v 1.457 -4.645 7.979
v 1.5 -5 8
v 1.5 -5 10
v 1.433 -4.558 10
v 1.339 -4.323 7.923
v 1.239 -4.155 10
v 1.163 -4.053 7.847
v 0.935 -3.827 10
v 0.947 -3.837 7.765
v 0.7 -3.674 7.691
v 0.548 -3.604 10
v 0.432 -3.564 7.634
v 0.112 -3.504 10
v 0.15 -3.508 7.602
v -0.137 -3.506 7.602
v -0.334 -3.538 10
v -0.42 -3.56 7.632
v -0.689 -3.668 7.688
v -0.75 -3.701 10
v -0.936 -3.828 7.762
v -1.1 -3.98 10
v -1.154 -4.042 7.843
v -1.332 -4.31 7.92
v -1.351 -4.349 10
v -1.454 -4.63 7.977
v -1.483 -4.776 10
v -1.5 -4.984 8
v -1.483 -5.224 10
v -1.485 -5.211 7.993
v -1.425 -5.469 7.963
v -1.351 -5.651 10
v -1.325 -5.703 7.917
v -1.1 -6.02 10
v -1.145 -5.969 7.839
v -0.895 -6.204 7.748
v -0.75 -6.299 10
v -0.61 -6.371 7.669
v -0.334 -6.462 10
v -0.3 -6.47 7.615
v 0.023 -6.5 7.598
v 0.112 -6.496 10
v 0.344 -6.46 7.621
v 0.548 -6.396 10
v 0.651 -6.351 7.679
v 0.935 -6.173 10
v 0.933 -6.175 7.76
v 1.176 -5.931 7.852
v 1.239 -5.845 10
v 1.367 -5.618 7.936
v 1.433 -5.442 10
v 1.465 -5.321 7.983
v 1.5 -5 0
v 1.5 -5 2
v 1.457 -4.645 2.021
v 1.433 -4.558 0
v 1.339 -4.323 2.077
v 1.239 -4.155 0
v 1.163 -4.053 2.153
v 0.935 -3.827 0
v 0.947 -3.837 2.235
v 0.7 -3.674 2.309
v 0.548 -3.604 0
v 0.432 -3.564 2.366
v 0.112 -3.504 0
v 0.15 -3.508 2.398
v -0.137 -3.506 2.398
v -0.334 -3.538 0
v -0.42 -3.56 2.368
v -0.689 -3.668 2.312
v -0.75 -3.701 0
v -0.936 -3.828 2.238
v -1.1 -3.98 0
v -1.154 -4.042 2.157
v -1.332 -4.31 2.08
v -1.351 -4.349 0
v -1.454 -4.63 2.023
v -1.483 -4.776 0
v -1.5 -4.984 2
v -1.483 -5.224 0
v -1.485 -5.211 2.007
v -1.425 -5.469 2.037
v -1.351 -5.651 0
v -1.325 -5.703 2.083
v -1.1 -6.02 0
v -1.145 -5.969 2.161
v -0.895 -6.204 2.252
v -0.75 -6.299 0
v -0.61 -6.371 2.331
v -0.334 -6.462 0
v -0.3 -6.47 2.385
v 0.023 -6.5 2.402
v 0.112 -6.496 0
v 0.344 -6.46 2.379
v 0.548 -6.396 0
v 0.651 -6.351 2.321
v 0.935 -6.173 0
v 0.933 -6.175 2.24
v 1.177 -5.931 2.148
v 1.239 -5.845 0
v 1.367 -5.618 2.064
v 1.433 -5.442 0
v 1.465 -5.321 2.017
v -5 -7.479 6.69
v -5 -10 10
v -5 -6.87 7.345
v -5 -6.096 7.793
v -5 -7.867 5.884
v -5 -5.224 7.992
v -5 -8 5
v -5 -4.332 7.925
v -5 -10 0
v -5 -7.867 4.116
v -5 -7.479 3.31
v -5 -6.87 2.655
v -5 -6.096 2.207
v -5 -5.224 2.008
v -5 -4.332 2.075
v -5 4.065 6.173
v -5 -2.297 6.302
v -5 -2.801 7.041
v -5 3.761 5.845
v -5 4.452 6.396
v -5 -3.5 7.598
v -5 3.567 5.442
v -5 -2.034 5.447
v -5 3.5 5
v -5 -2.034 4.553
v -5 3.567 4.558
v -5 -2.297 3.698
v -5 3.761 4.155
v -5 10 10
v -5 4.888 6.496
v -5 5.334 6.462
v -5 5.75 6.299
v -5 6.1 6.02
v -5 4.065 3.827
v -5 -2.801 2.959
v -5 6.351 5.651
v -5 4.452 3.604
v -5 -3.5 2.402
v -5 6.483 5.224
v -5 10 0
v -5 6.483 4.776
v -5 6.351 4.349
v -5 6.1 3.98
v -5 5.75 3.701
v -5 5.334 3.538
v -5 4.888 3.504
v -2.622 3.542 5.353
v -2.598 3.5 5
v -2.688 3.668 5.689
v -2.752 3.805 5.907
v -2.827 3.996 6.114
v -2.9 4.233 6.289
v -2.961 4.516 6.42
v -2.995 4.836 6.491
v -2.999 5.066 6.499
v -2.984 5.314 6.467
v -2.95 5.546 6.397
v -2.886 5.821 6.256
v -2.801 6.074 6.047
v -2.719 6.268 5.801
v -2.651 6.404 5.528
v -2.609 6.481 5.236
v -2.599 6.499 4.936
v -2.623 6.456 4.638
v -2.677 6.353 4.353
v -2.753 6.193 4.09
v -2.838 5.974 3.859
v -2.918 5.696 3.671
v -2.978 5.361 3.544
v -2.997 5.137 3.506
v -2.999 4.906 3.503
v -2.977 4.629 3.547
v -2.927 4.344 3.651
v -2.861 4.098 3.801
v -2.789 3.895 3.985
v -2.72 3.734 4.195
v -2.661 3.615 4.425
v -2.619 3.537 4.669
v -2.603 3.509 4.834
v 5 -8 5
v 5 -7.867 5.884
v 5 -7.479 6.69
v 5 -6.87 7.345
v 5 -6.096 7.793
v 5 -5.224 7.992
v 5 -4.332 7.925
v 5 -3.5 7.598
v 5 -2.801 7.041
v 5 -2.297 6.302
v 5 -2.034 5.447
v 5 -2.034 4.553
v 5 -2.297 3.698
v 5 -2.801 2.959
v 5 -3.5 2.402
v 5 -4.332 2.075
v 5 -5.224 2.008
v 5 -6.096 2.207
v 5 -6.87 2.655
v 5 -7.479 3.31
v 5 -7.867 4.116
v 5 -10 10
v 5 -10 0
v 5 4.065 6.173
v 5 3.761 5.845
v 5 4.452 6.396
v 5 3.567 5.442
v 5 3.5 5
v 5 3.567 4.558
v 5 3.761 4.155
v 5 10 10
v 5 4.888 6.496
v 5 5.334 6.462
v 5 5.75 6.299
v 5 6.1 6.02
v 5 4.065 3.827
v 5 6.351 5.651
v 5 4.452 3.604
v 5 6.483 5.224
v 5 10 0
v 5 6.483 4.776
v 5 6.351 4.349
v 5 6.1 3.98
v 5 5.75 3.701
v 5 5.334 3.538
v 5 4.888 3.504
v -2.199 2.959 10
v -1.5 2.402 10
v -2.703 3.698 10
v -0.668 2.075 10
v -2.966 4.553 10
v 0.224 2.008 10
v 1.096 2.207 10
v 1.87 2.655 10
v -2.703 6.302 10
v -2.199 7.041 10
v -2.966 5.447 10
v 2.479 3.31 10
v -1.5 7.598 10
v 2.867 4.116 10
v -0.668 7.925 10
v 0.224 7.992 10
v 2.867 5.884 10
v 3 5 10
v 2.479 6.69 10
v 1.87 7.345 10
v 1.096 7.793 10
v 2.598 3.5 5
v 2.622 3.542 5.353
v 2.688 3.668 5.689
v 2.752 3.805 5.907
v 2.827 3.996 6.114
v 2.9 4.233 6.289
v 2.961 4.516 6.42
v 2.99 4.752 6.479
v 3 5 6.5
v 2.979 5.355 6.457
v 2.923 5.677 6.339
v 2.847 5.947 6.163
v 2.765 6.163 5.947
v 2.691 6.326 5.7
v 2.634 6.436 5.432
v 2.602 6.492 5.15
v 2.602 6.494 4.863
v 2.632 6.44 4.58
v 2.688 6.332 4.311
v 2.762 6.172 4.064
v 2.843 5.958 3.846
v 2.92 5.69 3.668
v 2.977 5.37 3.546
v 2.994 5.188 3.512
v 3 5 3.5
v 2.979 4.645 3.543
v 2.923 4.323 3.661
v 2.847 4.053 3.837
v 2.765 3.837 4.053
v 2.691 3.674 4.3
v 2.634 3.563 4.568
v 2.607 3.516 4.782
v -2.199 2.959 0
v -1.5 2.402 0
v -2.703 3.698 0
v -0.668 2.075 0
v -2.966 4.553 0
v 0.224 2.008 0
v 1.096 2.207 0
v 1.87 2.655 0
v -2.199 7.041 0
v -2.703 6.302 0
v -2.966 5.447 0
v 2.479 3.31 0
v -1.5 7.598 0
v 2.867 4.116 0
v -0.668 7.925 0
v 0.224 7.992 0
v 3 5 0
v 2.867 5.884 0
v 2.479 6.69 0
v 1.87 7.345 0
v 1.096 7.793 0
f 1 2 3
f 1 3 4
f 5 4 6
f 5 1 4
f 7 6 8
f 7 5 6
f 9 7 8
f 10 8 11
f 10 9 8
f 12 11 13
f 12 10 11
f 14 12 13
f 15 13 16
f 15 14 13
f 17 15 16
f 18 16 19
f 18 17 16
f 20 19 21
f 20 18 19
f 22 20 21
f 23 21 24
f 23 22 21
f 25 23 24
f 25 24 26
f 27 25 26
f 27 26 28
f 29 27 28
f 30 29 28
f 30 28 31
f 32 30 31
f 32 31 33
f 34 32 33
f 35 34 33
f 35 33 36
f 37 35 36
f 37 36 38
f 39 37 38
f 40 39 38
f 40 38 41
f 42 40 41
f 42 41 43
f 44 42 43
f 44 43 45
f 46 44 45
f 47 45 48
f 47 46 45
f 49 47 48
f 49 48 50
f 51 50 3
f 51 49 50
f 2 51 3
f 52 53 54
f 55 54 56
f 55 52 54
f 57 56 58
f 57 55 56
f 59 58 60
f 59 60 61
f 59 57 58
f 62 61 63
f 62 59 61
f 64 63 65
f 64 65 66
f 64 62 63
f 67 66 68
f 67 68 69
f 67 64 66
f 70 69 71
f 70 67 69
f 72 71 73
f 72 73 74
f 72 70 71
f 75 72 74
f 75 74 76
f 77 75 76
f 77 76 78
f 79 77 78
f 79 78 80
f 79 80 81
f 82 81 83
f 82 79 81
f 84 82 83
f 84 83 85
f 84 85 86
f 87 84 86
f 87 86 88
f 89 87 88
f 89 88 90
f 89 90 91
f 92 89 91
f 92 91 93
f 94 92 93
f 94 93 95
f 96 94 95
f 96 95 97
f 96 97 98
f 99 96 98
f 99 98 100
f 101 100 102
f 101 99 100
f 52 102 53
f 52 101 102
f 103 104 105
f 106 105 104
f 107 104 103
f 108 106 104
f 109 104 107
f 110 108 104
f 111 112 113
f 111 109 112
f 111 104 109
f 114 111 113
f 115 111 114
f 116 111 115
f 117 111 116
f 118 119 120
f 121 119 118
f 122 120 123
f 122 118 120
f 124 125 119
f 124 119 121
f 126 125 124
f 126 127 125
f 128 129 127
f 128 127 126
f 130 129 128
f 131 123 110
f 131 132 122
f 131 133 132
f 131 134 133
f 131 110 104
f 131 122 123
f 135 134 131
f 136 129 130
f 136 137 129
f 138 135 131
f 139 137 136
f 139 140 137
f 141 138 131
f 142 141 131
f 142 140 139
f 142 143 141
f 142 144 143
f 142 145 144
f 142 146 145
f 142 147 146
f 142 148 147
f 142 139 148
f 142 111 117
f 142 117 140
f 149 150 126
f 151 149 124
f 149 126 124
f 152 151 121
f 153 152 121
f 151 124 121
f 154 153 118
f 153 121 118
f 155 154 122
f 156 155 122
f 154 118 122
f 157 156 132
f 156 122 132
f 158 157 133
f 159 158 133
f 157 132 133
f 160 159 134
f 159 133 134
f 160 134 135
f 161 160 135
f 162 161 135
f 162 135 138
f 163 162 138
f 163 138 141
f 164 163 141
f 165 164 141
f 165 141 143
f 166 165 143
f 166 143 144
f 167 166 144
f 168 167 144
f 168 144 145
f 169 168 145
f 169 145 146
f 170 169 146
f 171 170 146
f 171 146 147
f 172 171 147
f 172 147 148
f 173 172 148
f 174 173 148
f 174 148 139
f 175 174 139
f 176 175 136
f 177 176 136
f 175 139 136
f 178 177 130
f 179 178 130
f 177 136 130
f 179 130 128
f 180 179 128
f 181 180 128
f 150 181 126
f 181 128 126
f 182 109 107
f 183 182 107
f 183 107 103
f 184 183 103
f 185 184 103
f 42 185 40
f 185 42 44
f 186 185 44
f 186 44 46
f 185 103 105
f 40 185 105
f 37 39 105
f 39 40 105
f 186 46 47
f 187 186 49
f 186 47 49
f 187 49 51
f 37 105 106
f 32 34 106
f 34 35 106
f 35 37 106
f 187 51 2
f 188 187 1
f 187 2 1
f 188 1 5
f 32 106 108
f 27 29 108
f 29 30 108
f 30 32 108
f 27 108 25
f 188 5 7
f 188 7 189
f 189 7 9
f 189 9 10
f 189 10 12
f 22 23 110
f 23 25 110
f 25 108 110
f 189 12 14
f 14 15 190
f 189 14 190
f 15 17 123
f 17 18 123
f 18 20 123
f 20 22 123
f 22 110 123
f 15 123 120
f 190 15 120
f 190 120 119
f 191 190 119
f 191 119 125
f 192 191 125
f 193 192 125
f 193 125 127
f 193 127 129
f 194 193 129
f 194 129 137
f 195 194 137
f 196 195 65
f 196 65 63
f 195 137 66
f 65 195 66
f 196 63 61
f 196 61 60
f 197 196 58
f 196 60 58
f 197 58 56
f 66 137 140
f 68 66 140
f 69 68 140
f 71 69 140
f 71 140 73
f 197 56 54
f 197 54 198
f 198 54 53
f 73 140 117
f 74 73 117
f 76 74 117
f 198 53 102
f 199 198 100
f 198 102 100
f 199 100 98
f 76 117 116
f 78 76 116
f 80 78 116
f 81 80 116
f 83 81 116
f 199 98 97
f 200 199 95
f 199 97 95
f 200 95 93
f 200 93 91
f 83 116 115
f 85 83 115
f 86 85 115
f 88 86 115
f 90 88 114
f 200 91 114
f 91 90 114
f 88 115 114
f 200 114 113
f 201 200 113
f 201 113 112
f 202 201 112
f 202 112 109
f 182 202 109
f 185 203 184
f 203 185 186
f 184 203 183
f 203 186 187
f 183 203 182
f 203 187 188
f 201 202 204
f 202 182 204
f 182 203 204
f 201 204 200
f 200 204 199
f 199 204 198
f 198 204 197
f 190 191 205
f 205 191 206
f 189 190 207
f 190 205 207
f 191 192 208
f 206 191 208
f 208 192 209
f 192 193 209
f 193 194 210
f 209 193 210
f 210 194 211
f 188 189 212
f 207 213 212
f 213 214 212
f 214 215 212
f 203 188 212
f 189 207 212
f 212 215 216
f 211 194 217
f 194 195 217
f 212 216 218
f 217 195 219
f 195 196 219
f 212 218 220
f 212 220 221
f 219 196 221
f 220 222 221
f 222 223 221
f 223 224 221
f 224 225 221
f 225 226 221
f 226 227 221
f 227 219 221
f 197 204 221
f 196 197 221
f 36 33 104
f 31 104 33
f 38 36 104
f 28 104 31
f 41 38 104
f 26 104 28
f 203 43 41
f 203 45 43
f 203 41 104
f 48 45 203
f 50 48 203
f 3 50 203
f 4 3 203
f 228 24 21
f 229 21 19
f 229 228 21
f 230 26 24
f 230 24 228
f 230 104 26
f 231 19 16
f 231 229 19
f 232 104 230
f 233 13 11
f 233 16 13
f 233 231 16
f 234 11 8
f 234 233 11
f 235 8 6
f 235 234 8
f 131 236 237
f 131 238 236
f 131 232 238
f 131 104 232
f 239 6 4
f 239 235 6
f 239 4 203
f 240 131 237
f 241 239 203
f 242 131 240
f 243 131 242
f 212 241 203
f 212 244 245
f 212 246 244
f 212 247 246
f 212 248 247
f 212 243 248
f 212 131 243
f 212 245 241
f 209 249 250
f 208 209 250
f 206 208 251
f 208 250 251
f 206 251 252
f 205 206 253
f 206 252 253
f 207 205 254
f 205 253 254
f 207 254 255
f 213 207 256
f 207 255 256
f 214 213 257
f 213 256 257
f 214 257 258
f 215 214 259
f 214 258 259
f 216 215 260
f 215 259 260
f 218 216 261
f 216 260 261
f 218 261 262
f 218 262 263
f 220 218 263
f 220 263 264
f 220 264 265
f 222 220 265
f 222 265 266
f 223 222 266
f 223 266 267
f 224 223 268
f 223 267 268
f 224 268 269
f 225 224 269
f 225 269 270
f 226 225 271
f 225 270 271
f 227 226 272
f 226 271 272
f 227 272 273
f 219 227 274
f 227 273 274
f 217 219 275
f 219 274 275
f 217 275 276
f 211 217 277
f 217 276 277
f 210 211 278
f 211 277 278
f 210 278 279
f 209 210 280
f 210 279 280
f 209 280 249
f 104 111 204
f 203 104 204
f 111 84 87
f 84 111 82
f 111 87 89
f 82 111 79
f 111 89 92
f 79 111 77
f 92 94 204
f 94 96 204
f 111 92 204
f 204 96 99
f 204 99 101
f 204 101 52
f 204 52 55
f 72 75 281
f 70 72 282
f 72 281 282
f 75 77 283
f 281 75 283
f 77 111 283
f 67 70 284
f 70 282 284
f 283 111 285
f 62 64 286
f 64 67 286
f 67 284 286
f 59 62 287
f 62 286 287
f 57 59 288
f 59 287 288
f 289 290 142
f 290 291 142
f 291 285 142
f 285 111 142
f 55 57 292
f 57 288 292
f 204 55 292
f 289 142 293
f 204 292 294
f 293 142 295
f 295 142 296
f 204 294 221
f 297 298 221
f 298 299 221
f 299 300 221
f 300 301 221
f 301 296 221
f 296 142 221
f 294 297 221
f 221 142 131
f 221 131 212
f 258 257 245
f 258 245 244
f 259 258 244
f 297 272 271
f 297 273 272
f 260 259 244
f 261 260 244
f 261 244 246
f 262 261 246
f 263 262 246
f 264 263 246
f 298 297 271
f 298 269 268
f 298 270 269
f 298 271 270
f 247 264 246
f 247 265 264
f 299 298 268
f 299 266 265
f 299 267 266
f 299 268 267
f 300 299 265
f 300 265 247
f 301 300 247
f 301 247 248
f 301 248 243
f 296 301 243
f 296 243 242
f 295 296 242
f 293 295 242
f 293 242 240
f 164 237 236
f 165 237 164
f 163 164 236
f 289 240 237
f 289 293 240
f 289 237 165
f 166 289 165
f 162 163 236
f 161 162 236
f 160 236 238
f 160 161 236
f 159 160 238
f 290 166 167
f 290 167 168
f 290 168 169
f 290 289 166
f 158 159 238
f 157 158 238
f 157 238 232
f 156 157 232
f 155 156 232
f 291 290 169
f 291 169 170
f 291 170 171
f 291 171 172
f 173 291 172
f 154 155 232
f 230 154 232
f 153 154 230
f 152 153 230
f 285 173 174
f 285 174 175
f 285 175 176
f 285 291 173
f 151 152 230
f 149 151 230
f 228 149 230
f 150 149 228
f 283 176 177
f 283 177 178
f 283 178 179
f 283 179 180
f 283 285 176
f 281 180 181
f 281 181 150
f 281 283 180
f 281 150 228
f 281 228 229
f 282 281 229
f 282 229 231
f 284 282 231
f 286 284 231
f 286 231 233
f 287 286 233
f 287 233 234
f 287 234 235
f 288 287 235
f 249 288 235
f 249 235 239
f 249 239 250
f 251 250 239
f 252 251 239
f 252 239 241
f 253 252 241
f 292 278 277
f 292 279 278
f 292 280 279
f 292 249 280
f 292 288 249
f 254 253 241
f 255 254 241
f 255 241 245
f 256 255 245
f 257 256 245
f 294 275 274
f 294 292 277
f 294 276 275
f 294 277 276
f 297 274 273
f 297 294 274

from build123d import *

# Parameters (mm, degrees)
F0_W     = 10
F0_H     = 20
F0_R     = 1.5
F0_R_2   = 3
F1_DEPTH = 10
F2_R     = 3
F2_R_2   = 1.5
F3_DEPTH = 25


with BuildPart() as f1:
    # F0 (on Top) → F1 (new body)
    with BuildSketch(Plane.XY):
        Rectangle(F0_W, F0_H)
        with Locations((0, -5)):
            Circle(F0_R, mode=Mode.SUBTRACT)
        with Locations((0, 5)):
            Circle(F0_R_2, mode=Mode.SUBTRACT)
    extrude(amount=F1_DEPTH)

    # F2 (on face) → F3 (cut)
    with BuildSketch(Plane(origin=(-5, 0, 0), x_dir=(0, -1, 0), z_dir=(-1, 0, 0))):
        with Locations((5, 5)):
            Circle(F2_R)
        with Locations((-5, 5)):
            Circle(F2_R_2)
    extrude(amount=-F3_DEPTH, mode=Mode.SUBTRACT)


solid = f1.part
